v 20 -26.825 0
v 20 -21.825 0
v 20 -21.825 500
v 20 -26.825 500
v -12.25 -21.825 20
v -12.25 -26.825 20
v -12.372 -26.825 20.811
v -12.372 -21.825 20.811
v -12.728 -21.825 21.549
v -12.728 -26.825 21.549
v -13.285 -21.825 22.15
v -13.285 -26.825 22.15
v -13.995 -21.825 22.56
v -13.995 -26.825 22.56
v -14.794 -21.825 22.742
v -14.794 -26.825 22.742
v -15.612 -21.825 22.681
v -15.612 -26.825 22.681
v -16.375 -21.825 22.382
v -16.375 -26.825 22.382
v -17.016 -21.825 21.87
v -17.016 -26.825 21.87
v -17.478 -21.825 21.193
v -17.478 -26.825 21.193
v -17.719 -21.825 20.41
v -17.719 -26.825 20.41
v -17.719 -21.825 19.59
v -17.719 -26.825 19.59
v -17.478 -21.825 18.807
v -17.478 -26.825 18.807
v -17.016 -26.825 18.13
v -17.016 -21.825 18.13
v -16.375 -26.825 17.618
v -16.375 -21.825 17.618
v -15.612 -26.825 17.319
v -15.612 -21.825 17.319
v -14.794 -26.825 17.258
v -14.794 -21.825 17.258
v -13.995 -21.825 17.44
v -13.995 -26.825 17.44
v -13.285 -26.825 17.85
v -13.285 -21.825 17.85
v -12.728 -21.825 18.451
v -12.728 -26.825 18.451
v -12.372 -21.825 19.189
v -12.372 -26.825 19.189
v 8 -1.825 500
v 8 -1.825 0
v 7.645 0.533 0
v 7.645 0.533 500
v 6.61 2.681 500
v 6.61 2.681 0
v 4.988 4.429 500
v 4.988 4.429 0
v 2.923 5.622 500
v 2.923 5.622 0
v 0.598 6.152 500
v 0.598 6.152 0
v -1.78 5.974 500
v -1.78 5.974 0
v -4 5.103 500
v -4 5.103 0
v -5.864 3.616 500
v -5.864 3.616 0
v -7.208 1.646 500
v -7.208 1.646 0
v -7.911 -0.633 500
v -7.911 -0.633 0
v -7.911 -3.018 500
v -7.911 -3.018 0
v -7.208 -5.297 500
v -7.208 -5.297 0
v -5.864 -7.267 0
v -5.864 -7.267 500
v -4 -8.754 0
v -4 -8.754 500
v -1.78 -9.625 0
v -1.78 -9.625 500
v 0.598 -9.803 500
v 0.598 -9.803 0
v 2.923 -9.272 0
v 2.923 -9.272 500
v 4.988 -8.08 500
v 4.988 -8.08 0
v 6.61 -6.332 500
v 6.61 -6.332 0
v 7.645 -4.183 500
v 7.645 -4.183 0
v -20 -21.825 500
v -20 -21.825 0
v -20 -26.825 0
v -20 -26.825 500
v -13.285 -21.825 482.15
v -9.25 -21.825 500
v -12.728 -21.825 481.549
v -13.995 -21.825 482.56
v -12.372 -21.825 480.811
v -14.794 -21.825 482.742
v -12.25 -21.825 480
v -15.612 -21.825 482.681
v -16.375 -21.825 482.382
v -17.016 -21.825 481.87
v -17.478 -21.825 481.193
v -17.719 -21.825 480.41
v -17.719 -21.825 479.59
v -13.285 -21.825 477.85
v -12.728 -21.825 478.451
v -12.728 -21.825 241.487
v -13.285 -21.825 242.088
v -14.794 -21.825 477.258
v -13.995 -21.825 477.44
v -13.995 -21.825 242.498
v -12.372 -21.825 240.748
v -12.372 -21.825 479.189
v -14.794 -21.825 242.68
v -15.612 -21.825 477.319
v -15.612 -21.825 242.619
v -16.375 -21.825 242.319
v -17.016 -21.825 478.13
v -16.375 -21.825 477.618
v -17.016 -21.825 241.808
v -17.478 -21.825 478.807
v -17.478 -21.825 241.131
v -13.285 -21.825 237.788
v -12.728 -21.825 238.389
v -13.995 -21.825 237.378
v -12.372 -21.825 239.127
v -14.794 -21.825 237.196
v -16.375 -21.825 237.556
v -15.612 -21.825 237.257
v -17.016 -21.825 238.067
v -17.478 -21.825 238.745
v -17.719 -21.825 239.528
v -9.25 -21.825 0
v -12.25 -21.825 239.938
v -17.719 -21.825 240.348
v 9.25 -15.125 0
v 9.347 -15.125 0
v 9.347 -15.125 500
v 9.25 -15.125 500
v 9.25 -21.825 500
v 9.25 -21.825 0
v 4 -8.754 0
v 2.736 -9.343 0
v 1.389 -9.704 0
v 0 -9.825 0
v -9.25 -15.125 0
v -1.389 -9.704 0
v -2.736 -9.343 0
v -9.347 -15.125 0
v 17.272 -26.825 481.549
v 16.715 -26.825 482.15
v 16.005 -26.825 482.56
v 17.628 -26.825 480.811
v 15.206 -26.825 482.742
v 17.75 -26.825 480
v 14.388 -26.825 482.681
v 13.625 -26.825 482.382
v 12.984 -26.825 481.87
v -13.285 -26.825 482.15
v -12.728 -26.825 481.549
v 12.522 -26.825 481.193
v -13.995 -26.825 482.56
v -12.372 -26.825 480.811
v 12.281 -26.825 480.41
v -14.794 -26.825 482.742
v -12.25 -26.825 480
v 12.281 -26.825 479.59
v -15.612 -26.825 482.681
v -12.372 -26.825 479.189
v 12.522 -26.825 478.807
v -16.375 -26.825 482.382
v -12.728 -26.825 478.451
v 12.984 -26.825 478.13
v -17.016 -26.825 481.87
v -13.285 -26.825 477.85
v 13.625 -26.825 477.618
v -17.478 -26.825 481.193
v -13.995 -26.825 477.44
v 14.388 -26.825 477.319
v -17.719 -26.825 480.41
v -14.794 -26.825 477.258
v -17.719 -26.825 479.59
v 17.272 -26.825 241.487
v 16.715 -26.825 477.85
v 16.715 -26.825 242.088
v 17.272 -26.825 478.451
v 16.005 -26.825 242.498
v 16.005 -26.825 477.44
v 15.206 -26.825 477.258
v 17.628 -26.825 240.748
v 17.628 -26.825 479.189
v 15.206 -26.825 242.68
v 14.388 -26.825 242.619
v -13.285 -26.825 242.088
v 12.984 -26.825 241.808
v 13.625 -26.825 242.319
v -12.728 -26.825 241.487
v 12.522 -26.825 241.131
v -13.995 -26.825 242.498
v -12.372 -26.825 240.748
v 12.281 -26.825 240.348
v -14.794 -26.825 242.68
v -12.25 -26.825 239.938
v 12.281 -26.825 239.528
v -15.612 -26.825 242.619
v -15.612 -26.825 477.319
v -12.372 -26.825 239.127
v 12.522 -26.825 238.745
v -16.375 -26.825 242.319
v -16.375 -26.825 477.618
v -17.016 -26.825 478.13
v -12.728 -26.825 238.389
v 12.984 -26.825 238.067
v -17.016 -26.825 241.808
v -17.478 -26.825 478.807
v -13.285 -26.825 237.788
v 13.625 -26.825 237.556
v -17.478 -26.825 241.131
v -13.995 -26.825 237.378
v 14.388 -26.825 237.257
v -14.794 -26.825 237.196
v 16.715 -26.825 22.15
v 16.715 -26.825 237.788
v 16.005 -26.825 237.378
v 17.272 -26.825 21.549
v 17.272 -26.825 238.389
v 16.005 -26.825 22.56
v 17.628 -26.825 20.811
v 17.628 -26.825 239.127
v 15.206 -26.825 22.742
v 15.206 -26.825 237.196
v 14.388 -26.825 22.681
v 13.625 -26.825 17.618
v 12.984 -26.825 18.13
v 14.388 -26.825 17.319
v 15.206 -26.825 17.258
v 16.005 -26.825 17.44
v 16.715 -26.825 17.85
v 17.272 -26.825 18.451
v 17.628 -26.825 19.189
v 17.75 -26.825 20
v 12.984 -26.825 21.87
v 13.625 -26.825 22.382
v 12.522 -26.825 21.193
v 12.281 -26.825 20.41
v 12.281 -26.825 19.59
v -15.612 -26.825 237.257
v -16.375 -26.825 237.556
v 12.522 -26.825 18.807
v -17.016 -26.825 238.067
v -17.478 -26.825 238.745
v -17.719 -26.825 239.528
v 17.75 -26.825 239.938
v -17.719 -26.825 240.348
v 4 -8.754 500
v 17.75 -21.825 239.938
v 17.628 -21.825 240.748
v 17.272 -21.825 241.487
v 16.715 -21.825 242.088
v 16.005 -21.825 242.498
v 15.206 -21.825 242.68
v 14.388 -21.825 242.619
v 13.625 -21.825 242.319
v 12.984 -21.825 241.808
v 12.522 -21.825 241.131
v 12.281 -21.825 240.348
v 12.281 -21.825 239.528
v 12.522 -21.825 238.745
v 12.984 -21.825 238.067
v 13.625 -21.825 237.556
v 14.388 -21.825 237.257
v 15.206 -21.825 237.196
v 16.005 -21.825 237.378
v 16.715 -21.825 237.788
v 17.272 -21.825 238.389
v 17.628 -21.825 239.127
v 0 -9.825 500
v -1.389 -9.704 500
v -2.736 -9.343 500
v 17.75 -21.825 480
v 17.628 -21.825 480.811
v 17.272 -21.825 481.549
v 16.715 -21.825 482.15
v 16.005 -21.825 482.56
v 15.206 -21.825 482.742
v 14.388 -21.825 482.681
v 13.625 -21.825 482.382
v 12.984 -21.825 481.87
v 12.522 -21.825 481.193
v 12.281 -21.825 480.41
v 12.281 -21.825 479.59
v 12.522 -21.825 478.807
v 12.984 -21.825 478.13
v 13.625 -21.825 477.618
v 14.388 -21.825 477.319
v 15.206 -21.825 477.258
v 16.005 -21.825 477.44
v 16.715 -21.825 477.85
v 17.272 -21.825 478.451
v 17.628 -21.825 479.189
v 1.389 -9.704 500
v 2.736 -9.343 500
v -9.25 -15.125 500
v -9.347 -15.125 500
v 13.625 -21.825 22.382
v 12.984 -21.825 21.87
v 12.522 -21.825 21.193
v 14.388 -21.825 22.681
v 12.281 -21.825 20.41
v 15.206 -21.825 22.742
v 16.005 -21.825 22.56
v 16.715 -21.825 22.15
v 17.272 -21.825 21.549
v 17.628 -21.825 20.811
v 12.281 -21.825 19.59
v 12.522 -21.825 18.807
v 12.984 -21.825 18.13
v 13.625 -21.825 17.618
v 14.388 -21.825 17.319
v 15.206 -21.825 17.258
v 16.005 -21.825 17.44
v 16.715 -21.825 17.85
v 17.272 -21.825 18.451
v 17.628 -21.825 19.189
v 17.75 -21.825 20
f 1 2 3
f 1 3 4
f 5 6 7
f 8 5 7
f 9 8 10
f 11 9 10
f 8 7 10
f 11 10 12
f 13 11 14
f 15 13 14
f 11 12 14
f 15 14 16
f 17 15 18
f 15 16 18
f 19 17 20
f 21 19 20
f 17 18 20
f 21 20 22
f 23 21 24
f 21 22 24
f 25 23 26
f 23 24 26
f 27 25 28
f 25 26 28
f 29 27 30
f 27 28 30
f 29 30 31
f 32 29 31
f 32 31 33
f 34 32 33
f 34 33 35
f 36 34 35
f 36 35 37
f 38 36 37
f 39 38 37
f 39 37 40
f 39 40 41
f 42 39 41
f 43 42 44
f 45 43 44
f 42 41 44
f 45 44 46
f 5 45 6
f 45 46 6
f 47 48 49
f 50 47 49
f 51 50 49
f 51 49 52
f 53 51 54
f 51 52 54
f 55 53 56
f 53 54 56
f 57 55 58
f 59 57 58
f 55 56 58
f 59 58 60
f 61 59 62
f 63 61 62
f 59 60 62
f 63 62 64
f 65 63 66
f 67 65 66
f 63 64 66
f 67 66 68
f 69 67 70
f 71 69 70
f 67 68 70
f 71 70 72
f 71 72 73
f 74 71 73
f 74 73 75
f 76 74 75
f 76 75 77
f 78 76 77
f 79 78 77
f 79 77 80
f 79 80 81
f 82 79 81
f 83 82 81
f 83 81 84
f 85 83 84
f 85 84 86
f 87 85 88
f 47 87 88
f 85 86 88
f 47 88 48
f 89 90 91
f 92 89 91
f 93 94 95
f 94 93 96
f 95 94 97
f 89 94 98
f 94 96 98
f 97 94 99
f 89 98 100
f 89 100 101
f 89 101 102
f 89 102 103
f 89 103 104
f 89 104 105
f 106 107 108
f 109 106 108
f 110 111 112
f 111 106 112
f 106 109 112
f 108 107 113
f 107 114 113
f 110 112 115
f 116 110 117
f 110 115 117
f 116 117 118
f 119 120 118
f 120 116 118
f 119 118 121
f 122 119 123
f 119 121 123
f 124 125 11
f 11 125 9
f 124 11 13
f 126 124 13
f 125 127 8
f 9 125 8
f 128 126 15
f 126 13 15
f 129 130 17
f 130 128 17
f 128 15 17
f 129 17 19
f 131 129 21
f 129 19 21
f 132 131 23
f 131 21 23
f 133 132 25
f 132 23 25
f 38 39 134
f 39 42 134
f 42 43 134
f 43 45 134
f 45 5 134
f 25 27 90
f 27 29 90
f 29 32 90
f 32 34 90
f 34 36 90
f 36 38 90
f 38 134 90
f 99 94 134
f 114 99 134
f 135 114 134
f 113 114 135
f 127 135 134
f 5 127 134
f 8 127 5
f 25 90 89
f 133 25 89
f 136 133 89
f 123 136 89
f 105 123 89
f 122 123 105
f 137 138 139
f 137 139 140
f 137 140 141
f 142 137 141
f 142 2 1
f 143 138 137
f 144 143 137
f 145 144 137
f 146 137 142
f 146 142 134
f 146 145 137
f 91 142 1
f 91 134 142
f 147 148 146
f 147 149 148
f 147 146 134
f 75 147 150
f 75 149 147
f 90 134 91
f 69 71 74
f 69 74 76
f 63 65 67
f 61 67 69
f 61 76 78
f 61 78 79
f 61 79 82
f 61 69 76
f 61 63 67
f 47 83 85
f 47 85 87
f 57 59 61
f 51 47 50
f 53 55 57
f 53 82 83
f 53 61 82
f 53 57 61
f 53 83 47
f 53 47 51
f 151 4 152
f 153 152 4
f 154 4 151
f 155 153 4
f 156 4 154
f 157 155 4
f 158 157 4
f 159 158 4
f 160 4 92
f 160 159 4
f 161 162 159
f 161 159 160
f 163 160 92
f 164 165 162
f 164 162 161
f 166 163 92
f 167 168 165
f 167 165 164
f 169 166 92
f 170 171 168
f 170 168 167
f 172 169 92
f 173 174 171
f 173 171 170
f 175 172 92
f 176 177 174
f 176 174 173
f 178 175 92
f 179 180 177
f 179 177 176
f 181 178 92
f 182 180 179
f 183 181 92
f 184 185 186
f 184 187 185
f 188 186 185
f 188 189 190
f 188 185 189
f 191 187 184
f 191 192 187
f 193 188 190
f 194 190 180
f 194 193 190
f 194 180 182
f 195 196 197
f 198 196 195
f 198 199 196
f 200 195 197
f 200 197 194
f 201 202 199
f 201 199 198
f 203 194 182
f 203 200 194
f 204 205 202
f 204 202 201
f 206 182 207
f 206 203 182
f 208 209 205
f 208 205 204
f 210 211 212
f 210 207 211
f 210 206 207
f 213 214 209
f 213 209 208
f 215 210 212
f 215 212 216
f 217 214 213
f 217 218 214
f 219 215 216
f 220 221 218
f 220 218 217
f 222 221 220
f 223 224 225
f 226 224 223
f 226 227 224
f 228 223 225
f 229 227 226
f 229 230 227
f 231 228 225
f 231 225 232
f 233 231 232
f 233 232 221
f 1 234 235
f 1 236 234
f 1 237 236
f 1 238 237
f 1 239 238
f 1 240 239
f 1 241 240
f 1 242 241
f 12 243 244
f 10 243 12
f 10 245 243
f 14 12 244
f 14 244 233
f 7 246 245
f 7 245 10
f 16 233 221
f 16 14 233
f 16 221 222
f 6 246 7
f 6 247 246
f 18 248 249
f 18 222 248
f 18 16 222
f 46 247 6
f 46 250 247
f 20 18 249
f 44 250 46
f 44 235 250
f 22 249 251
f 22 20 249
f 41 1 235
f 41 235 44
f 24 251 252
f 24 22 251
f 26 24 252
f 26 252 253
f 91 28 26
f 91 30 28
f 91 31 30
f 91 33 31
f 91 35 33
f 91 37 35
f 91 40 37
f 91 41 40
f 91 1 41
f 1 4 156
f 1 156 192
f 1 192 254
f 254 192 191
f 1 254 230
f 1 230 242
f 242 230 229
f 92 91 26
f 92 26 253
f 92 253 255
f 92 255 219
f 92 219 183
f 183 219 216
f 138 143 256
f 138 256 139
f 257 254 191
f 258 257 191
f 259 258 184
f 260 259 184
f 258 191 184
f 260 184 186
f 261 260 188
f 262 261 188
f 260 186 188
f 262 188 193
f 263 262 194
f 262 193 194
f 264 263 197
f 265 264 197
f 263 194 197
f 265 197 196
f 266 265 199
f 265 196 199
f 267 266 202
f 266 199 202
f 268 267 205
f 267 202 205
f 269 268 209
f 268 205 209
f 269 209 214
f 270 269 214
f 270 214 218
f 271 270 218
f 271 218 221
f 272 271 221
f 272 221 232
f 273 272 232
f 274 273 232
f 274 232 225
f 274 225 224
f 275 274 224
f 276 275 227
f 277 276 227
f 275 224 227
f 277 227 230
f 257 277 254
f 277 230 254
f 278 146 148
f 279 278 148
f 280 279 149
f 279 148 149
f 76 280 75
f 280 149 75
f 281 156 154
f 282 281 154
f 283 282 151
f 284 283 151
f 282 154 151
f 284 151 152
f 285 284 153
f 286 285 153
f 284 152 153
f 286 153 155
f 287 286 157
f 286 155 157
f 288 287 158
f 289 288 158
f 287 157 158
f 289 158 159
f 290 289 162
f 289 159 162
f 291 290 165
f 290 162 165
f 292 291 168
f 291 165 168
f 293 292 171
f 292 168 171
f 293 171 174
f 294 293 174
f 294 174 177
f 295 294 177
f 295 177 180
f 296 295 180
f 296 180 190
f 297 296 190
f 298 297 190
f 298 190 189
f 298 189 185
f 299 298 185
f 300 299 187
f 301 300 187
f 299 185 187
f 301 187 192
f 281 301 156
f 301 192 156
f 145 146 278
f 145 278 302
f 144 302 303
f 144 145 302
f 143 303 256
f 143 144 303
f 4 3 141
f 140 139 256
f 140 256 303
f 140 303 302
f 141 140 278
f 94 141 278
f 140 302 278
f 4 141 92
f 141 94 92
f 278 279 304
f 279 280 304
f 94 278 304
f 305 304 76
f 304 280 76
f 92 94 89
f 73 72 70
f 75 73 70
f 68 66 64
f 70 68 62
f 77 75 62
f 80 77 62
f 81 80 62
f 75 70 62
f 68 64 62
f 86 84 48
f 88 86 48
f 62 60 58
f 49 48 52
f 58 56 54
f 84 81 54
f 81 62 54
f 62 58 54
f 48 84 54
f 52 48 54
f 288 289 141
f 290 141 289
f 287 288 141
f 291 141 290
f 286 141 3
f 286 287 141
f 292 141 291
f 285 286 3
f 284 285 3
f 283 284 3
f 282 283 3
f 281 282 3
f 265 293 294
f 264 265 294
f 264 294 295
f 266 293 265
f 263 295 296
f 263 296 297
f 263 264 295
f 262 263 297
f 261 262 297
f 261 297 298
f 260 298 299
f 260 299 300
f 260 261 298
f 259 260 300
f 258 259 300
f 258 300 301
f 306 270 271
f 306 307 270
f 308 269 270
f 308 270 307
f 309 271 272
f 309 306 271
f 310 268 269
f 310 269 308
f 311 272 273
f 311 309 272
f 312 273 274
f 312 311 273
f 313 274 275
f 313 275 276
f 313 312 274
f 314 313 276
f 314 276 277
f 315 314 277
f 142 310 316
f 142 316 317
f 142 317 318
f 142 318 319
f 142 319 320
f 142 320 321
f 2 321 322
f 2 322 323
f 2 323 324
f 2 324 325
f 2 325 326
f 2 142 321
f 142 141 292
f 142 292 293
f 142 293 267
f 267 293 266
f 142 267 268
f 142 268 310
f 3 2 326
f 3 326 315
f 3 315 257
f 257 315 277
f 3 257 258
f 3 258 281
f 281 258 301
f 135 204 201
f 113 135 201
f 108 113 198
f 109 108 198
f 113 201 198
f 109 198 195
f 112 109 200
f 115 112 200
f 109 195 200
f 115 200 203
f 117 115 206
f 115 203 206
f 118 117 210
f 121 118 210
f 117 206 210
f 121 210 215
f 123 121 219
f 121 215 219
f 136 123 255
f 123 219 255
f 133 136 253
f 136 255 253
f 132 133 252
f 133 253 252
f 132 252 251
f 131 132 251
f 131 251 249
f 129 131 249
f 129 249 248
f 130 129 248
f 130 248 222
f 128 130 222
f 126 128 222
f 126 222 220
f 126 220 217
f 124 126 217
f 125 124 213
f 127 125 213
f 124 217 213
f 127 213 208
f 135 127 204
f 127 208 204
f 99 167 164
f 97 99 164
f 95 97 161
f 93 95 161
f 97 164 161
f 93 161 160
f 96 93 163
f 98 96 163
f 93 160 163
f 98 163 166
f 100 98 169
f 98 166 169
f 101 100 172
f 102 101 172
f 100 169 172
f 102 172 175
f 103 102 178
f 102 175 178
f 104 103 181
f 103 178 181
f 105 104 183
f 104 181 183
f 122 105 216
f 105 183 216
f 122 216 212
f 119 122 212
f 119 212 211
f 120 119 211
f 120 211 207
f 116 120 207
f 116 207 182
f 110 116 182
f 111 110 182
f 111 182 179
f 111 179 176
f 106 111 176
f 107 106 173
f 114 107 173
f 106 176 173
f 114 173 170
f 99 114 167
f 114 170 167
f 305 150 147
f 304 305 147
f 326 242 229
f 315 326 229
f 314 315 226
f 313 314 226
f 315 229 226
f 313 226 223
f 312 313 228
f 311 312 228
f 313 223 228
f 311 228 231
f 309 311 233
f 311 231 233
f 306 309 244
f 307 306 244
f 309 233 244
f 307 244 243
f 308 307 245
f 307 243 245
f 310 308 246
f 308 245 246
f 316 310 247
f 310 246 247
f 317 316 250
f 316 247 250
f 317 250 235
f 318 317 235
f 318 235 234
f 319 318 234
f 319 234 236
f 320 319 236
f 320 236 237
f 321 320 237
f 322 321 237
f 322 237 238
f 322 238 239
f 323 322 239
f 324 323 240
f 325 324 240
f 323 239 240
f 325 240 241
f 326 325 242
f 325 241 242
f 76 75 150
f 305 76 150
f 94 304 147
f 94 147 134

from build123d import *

# Parameters (mm, degrees)
SKETCH1_R          = 8
EXTRUDE1_DEPTH     = 500
EXTRUDE3_DEPTH     = 500
SKETCH8_R          = 2.75
CUT_EXTRUDE1_DEPTH = 5


with BuildPart() as part:
    # Sketch1 → Extrude1 (new body)
    with BuildSketch(Plane.XY):
        with Locations((0, -1.825456957)):
            Circle(SKETCH1_R)
    extrude(amount=EXTRUDE1_DEPTH)


with BuildPart() as body_2:
    # Sketch2 → Extrude3 (new body)
    with BuildSketch(Plane.XY):
        with BuildLine():
            Line((4, -8.753660187), (9.346572319, -15.125456957))
            Line((9.346572319, -15.125456957), (9.25, -15.125456957))
            Line((9.25, -15.125456957), (9.25, -21.825456957))
            Line((9.25, -21.825456957), (20, -21.825456957))
            Line((20, -21.825456957), (20, -26.825456957))
            Line((20, -26.825456957), (0, -26.825456957))
            Line((0, -26.825456957), (0, -9.825456957))
            ThreePointArc((0, -9.825456957), (2.070552361, -9.552863567), (4, -8.753660187))
        make_face()
    extrude(amount=EXTRUDE3_DEPTH)


with BuildPart() as body_3:
    # Mirror5: mirrored copy
    add(body_2.part.mirror(Plane(origin=(0, -26.825456957, 500), x_dir=(0, 0, 1), z_dir=(1, 0, 0))))

    # Combine1: union body 2
    add(body_2.part)

    # Sketch8 → Cut-Extrude1 (cut)
    with BuildSketch(Plane.XZ.offset(26.825456957)):
        with Locations((-15, 20)):
            Circle(SKETCH8_R)
        with Locations((15, 20)):
            Circle(SKETCH8_R)
        with Locations((-15, 239.937905992)):
            Circle(SKETCH8_R)
        with Locations((15, 239.937905992)):
            Circle(SKETCH8_R)
        with Locations((-15, 480)):
            Circle(SKETCH8_R)
        with Locations((15, 480)):
            Circle(SKETCH8_R)
    extrude(amount=-CUT_EXTRUDE1_DEPTH, mode=Mode.SUBTRACT)


solid = Compound([part.part, body_3.part])
